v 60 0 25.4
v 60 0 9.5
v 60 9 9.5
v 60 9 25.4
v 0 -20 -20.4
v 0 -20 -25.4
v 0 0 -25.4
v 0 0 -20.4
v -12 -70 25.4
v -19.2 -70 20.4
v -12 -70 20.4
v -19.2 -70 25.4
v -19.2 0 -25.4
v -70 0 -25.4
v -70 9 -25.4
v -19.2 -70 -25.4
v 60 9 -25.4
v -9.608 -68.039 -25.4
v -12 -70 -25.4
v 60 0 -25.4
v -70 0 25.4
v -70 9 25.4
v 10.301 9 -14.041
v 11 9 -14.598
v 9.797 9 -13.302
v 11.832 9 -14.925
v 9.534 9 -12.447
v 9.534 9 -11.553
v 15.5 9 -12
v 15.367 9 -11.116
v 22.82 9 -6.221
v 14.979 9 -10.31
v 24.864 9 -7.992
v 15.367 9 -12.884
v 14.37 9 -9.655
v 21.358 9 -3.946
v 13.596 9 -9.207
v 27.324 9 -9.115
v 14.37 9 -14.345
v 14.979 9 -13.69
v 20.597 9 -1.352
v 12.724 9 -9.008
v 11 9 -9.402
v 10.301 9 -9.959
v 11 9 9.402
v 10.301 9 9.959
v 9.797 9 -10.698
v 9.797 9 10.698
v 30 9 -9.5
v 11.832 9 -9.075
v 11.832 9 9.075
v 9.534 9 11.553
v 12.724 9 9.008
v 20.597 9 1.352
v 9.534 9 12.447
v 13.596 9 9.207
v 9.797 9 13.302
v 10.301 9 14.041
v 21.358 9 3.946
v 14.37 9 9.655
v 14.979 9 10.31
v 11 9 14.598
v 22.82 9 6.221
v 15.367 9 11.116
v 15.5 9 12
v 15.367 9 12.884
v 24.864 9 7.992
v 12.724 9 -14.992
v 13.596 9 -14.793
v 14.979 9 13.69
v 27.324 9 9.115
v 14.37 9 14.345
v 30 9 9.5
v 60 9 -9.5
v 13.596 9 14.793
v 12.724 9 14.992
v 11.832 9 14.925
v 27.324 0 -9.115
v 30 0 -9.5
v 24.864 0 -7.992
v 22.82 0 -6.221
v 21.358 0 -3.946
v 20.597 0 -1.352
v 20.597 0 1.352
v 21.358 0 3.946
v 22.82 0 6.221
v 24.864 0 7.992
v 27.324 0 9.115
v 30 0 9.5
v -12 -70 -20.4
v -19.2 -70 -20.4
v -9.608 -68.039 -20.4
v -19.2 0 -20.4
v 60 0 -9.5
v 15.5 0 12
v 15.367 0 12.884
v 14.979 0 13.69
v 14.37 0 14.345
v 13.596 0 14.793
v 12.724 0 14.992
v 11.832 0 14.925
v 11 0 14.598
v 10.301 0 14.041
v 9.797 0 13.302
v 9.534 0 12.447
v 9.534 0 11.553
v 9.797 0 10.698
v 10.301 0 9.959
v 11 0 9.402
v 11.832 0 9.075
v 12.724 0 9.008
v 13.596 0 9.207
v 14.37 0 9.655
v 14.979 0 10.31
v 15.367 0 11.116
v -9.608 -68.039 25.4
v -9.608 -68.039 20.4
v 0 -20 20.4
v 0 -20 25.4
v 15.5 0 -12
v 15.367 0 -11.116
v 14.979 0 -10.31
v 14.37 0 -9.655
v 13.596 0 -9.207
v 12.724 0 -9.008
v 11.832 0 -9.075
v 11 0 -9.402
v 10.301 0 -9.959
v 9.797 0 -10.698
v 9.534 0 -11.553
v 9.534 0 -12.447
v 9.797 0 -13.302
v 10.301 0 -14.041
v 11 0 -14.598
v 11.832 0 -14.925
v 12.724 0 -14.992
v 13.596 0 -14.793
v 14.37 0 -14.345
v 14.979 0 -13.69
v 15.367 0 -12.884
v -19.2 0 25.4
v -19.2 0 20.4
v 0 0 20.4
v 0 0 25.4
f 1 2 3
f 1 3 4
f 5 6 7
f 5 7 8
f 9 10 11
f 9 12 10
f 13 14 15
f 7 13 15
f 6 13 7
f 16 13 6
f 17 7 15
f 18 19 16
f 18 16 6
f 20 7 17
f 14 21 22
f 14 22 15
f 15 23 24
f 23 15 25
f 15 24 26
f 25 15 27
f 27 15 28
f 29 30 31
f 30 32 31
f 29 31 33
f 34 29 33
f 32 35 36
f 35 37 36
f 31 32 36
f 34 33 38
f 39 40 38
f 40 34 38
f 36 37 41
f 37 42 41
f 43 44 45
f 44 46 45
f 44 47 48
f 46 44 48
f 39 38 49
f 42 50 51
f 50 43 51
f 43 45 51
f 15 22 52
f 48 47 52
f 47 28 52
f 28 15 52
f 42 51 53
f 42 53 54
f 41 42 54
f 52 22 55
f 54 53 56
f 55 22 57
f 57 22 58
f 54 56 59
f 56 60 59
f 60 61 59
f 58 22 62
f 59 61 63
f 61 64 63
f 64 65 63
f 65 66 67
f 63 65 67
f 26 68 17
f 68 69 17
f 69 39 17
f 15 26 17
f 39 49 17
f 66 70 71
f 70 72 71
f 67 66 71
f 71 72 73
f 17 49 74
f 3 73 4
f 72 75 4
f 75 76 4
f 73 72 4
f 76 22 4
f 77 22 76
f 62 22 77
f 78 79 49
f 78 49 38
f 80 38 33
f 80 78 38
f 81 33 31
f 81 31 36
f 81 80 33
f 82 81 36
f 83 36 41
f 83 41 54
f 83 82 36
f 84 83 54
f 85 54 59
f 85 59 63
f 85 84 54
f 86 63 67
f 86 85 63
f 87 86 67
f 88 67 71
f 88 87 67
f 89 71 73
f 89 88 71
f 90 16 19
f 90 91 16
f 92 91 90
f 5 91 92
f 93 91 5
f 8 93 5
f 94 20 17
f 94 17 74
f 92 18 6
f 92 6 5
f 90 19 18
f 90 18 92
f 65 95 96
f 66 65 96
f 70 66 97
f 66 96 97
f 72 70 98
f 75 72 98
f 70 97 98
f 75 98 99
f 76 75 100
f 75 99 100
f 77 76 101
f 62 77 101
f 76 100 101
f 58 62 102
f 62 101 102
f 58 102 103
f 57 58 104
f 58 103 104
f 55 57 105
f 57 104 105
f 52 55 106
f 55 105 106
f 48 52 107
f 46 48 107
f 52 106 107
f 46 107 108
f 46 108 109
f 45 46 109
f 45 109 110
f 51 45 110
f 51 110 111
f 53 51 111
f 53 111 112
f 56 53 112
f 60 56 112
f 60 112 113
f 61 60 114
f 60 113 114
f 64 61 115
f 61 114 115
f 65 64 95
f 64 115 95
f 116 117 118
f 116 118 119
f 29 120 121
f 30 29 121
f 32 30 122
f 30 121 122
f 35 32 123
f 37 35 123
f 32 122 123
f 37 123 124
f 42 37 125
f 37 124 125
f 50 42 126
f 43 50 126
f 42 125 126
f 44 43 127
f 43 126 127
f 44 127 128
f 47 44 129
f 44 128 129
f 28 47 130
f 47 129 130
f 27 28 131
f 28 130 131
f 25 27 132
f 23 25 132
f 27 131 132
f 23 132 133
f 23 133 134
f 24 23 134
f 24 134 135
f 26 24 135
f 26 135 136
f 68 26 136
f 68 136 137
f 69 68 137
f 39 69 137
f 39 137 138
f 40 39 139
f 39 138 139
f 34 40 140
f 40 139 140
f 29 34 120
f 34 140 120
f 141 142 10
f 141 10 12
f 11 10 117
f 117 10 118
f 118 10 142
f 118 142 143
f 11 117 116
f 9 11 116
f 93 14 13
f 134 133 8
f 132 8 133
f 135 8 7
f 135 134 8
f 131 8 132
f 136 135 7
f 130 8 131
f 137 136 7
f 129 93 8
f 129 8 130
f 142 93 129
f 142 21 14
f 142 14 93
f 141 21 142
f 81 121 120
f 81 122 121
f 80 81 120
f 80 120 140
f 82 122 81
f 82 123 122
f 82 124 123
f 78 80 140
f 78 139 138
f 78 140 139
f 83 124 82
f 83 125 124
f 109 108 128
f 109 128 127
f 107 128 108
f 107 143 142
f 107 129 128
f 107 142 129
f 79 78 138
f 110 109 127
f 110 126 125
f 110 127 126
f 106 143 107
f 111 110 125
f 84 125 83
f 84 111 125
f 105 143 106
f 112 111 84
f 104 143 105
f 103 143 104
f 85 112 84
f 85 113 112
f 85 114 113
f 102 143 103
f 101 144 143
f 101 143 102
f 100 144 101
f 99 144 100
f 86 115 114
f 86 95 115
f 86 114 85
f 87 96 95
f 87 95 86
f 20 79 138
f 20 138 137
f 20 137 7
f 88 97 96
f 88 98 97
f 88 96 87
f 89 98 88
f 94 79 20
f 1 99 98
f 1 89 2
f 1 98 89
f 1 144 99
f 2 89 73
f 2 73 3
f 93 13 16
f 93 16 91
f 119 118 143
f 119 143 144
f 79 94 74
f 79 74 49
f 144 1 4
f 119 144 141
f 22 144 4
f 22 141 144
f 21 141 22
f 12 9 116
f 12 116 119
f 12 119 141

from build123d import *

# Parameters (mm, degrees)
F0_R     = 3
F0_W     = 20
F0_H     = 5
F1_DEPTH = 9
F2_W     = 19.2
F2_H     = 5
F3_DEPTH = 70
F4_SIZE2 = 50
F4_SIZE  = 10
F5_SIZE2 = 50
F5_SIZE  = 10
F6_SIZE  = 2


with BuildPart() as f1:
    # F0 (on Front) → F1 (new body)
    with BuildSketch(Plane.XZ):
        with BuildLine():
            Line((-19.2, 25.4), (-70, 25.4))
            Line((-70, 25.4), (-70, -25.4))
            Line((-70, -25.4), (-19.2, -25.4))
            Line((-19.2, -25.4), (-19.2, -20.4))
            Line((-19.2, -20.4), (0.8, -20.4))
            Line((0.8, -20.4), (0.8, -25.4))
            Line((0.8, -25.4), (60, -25.4))
            Line((60, -25.4), (60, -9.5))
            Line((60, -9.5), (30, -9.5))
            ThreePointArc((30, -9.5), (20.5, 0), (30, 9.5))
            Line((30, 9.5), (60, 9.5))
            Line((60, 9.5), (60, 25.4))
            Line((60, 25.4), (0.8, 25.4))
            Line((0.8, 25.4), (0.8, 20.4))
            Line((0.8, 20.4), (-19.2, 20.4))
            Line((-19.2, 20.4), (-19.2, 25.4))
        make_face()
        with Locations((12.5, -12)):
            Circle(F0_R, mode=Mode.SUBTRACT)
        with Locations((12.5, 12)):
            Circle(F0_R, mode=Mode.SUBTRACT)
        with Locations((-9.2, 22.9)):
            Rectangle(F0_W, F0_H)
        with Locations((-9.2, -22.9)):
            Rectangle(F0_W, F0_H)
    extrude(amount=-F1_DEPTH)

    # F2 (on face) → F3 (join)
    with BuildSketch(Plane.XZ):
        with Locations((-9.6, 22.9)):
            Rectangle(F2_W, F2_H)
        with Locations((-9.6, -22.9)):
            Rectangle(F2_W, F2_H)
    extrude(amount=F3_DEPTH)

    # F4
    f4_edges = [f1.edges().sort_by_distance(p)[0] for p in [
        (0, -70, 22.9),
    ]]
    f4_side = f1.faces().sort_by_distance((-9.6, -70, 22.9))[0]
    chamfer(f4_edges, length=F4_SIZE, length2=F4_SIZE2, reference=f4_side)

    # F5
    f5_edges = [f1.edges().sort_by_distance(p)[0] for p in [
        (0, -70, -22.9),
    ]]
    f5_side = f1.faces().sort_by_distance((-9.6, -70, -22.9))[0]
    chamfer(f5_edges, length=F5_SIZE, length2=F5_SIZE2, reference=f5_side)

    # F6
    f6_edges = [f1.edges().sort_by_distance(p)[0] for p in [
        (-10, -70, 22.9),
        (-10, -70, -22.9),
    ]]
    chamfer(f6_edges, length=F6_SIZE)


solid = f1.part
